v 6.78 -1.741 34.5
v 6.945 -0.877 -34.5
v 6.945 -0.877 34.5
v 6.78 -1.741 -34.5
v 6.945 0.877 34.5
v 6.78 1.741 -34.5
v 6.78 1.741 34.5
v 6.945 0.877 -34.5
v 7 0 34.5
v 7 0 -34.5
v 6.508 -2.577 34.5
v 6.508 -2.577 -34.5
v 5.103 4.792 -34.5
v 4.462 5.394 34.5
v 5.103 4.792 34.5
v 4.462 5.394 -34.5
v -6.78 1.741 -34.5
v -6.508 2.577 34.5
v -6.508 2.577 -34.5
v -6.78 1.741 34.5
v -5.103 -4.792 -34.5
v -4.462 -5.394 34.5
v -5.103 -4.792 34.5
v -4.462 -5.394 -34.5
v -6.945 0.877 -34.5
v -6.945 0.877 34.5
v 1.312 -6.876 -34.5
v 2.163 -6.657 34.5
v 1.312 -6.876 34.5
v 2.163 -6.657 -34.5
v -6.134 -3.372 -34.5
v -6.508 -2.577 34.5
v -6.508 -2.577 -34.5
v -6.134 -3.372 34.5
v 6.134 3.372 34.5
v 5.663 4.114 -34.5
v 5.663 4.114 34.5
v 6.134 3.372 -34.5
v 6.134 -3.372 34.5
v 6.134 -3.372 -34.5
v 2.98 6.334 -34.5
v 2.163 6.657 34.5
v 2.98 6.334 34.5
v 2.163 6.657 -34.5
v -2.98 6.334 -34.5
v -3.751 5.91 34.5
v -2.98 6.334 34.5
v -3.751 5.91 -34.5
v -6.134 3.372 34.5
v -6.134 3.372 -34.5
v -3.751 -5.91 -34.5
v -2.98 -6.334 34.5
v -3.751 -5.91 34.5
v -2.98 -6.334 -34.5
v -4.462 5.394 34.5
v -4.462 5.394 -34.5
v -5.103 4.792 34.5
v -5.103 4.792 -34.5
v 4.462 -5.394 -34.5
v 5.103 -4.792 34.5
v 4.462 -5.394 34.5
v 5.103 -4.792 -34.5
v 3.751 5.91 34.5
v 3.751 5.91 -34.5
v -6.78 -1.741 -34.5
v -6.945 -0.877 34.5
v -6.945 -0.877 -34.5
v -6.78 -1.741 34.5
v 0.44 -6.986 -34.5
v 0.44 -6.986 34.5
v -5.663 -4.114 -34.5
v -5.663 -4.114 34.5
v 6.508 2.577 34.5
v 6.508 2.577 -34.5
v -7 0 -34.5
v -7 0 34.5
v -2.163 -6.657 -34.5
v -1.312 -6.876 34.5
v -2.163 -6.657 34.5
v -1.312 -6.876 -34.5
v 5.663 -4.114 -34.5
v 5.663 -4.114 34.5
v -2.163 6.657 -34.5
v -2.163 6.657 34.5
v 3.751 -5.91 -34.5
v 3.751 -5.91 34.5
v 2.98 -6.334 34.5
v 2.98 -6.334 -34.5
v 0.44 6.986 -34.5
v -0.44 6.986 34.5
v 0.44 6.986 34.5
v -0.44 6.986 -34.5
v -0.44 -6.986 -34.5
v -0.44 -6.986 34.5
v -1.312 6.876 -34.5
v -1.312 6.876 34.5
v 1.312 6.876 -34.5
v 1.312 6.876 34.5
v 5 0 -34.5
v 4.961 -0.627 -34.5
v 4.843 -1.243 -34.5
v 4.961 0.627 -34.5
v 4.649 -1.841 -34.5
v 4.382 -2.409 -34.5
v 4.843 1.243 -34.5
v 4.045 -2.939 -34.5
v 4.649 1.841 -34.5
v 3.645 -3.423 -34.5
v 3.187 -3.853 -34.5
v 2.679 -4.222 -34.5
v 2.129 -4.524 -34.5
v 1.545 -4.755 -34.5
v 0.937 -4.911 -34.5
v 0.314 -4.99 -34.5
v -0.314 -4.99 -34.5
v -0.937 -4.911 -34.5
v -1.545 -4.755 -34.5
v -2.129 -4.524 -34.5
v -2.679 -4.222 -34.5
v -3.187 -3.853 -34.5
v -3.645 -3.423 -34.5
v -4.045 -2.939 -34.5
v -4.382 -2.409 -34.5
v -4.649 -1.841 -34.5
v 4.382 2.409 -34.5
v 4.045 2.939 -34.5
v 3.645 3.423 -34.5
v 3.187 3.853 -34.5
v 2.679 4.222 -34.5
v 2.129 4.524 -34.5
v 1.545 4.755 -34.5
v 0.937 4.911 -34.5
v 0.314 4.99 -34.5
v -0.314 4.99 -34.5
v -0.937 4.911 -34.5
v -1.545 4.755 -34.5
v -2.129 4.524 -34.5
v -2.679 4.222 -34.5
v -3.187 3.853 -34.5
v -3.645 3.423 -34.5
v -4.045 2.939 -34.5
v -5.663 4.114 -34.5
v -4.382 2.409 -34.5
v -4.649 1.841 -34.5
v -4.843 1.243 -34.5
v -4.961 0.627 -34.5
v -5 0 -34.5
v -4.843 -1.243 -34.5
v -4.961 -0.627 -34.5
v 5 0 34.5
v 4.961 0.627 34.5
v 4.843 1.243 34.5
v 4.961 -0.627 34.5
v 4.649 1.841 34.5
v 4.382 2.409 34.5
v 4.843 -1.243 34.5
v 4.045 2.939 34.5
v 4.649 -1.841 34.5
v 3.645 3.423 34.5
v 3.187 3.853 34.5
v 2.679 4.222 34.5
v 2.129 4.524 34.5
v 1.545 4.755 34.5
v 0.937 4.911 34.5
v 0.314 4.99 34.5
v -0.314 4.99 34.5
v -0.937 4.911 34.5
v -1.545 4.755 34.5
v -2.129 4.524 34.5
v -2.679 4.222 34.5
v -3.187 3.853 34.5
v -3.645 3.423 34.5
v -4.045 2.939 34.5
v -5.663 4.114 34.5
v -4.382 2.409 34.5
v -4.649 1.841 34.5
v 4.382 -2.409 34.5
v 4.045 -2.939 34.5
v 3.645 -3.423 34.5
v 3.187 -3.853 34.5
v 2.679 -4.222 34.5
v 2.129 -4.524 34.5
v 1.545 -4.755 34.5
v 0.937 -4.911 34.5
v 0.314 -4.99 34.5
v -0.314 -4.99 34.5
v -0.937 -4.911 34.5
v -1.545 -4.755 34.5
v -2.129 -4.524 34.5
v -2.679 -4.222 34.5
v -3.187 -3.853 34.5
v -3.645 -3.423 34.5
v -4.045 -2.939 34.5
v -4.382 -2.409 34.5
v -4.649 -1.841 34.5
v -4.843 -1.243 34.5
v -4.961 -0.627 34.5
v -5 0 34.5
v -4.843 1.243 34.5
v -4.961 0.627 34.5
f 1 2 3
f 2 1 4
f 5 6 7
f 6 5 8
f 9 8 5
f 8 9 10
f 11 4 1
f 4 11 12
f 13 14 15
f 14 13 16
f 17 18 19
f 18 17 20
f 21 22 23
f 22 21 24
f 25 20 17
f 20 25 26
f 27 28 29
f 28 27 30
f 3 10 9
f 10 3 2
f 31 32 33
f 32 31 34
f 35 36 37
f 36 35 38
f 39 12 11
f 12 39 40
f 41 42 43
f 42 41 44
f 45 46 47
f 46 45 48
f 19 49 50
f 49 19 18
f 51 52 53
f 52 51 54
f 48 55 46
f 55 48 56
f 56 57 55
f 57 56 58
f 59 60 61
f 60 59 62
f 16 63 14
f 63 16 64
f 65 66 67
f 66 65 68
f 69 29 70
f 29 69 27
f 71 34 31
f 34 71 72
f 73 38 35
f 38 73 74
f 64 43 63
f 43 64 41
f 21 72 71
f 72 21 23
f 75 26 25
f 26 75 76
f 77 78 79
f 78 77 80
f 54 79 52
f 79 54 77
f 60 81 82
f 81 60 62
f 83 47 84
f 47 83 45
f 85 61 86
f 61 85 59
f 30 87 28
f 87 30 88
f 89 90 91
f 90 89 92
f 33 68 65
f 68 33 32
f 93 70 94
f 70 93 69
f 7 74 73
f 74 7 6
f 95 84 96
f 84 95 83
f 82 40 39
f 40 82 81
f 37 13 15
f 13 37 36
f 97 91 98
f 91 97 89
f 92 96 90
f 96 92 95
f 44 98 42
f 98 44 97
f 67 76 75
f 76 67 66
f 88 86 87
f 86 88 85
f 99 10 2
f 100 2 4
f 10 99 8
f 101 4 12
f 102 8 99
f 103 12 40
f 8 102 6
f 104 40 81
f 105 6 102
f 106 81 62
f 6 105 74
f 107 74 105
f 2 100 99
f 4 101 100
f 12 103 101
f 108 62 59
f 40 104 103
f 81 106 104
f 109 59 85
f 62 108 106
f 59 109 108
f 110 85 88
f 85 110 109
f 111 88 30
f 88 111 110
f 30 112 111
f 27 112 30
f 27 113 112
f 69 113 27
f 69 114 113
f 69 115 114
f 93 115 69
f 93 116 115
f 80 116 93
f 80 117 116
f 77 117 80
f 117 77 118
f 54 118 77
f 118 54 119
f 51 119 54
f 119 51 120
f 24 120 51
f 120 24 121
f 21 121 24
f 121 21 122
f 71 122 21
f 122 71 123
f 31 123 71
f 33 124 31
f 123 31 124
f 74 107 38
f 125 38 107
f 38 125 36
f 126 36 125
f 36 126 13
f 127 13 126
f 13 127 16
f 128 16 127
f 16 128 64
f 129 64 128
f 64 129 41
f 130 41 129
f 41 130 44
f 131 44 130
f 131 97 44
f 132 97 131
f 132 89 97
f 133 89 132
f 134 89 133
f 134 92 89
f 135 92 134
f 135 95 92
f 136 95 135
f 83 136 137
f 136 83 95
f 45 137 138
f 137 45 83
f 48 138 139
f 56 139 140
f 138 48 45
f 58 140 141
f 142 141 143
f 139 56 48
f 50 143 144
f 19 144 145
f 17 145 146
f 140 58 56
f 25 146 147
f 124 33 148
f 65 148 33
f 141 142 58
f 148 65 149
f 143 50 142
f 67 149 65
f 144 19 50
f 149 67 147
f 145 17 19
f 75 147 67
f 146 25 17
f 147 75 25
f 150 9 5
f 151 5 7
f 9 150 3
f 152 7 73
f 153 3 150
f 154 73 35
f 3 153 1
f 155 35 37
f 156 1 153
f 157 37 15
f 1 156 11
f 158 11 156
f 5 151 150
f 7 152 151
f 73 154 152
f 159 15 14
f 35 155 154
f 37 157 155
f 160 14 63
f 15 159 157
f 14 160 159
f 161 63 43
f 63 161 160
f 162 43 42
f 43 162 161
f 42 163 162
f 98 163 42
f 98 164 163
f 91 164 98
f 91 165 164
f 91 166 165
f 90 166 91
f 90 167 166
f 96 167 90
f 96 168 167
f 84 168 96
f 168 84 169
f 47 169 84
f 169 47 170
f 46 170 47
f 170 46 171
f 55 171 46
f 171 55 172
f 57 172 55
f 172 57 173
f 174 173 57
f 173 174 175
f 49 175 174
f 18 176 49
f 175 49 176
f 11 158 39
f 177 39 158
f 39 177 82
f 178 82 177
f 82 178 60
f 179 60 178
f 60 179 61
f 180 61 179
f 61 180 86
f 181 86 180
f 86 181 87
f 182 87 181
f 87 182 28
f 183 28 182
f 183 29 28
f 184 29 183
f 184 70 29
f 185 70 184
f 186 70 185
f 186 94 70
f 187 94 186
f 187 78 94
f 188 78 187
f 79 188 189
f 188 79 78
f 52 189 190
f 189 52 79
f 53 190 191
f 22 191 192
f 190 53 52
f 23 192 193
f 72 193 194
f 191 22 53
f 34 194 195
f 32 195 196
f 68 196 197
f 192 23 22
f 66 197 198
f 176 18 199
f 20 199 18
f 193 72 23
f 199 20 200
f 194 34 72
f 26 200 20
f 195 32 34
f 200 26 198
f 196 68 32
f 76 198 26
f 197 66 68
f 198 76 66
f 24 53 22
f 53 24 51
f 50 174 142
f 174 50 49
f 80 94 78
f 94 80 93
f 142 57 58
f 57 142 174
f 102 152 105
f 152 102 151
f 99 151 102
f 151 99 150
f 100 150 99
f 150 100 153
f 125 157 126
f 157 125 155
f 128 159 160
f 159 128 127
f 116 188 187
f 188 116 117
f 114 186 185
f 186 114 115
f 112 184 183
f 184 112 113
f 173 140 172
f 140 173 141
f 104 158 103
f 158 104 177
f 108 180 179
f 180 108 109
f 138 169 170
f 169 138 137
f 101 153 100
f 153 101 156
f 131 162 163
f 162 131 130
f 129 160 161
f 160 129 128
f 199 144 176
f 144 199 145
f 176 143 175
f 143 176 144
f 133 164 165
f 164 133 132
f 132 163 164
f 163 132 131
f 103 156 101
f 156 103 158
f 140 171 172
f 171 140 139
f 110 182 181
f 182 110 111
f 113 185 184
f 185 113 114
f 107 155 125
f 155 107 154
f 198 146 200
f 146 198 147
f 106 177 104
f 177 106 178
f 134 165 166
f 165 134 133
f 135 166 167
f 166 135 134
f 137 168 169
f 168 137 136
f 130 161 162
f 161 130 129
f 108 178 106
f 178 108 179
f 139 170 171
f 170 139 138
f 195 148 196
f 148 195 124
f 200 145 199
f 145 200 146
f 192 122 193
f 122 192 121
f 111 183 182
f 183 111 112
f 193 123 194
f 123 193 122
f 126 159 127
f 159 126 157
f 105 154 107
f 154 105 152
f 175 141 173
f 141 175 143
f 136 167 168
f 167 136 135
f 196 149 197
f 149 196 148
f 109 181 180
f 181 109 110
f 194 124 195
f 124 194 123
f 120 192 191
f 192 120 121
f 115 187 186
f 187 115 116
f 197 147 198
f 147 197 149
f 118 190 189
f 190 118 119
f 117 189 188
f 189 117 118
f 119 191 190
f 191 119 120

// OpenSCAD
$fn = 50;


difference() {
	union() {
		translate(v = [0, 0, -34.5000000000]) {
			cylinder(h = 69, r = 7.0000000000);
		}
	}
	union() {
		translate(v = [0, 0, -100.0000000000]) {
			cylinder(h = 200, r = 5.0000000000);
		}
	}
}
